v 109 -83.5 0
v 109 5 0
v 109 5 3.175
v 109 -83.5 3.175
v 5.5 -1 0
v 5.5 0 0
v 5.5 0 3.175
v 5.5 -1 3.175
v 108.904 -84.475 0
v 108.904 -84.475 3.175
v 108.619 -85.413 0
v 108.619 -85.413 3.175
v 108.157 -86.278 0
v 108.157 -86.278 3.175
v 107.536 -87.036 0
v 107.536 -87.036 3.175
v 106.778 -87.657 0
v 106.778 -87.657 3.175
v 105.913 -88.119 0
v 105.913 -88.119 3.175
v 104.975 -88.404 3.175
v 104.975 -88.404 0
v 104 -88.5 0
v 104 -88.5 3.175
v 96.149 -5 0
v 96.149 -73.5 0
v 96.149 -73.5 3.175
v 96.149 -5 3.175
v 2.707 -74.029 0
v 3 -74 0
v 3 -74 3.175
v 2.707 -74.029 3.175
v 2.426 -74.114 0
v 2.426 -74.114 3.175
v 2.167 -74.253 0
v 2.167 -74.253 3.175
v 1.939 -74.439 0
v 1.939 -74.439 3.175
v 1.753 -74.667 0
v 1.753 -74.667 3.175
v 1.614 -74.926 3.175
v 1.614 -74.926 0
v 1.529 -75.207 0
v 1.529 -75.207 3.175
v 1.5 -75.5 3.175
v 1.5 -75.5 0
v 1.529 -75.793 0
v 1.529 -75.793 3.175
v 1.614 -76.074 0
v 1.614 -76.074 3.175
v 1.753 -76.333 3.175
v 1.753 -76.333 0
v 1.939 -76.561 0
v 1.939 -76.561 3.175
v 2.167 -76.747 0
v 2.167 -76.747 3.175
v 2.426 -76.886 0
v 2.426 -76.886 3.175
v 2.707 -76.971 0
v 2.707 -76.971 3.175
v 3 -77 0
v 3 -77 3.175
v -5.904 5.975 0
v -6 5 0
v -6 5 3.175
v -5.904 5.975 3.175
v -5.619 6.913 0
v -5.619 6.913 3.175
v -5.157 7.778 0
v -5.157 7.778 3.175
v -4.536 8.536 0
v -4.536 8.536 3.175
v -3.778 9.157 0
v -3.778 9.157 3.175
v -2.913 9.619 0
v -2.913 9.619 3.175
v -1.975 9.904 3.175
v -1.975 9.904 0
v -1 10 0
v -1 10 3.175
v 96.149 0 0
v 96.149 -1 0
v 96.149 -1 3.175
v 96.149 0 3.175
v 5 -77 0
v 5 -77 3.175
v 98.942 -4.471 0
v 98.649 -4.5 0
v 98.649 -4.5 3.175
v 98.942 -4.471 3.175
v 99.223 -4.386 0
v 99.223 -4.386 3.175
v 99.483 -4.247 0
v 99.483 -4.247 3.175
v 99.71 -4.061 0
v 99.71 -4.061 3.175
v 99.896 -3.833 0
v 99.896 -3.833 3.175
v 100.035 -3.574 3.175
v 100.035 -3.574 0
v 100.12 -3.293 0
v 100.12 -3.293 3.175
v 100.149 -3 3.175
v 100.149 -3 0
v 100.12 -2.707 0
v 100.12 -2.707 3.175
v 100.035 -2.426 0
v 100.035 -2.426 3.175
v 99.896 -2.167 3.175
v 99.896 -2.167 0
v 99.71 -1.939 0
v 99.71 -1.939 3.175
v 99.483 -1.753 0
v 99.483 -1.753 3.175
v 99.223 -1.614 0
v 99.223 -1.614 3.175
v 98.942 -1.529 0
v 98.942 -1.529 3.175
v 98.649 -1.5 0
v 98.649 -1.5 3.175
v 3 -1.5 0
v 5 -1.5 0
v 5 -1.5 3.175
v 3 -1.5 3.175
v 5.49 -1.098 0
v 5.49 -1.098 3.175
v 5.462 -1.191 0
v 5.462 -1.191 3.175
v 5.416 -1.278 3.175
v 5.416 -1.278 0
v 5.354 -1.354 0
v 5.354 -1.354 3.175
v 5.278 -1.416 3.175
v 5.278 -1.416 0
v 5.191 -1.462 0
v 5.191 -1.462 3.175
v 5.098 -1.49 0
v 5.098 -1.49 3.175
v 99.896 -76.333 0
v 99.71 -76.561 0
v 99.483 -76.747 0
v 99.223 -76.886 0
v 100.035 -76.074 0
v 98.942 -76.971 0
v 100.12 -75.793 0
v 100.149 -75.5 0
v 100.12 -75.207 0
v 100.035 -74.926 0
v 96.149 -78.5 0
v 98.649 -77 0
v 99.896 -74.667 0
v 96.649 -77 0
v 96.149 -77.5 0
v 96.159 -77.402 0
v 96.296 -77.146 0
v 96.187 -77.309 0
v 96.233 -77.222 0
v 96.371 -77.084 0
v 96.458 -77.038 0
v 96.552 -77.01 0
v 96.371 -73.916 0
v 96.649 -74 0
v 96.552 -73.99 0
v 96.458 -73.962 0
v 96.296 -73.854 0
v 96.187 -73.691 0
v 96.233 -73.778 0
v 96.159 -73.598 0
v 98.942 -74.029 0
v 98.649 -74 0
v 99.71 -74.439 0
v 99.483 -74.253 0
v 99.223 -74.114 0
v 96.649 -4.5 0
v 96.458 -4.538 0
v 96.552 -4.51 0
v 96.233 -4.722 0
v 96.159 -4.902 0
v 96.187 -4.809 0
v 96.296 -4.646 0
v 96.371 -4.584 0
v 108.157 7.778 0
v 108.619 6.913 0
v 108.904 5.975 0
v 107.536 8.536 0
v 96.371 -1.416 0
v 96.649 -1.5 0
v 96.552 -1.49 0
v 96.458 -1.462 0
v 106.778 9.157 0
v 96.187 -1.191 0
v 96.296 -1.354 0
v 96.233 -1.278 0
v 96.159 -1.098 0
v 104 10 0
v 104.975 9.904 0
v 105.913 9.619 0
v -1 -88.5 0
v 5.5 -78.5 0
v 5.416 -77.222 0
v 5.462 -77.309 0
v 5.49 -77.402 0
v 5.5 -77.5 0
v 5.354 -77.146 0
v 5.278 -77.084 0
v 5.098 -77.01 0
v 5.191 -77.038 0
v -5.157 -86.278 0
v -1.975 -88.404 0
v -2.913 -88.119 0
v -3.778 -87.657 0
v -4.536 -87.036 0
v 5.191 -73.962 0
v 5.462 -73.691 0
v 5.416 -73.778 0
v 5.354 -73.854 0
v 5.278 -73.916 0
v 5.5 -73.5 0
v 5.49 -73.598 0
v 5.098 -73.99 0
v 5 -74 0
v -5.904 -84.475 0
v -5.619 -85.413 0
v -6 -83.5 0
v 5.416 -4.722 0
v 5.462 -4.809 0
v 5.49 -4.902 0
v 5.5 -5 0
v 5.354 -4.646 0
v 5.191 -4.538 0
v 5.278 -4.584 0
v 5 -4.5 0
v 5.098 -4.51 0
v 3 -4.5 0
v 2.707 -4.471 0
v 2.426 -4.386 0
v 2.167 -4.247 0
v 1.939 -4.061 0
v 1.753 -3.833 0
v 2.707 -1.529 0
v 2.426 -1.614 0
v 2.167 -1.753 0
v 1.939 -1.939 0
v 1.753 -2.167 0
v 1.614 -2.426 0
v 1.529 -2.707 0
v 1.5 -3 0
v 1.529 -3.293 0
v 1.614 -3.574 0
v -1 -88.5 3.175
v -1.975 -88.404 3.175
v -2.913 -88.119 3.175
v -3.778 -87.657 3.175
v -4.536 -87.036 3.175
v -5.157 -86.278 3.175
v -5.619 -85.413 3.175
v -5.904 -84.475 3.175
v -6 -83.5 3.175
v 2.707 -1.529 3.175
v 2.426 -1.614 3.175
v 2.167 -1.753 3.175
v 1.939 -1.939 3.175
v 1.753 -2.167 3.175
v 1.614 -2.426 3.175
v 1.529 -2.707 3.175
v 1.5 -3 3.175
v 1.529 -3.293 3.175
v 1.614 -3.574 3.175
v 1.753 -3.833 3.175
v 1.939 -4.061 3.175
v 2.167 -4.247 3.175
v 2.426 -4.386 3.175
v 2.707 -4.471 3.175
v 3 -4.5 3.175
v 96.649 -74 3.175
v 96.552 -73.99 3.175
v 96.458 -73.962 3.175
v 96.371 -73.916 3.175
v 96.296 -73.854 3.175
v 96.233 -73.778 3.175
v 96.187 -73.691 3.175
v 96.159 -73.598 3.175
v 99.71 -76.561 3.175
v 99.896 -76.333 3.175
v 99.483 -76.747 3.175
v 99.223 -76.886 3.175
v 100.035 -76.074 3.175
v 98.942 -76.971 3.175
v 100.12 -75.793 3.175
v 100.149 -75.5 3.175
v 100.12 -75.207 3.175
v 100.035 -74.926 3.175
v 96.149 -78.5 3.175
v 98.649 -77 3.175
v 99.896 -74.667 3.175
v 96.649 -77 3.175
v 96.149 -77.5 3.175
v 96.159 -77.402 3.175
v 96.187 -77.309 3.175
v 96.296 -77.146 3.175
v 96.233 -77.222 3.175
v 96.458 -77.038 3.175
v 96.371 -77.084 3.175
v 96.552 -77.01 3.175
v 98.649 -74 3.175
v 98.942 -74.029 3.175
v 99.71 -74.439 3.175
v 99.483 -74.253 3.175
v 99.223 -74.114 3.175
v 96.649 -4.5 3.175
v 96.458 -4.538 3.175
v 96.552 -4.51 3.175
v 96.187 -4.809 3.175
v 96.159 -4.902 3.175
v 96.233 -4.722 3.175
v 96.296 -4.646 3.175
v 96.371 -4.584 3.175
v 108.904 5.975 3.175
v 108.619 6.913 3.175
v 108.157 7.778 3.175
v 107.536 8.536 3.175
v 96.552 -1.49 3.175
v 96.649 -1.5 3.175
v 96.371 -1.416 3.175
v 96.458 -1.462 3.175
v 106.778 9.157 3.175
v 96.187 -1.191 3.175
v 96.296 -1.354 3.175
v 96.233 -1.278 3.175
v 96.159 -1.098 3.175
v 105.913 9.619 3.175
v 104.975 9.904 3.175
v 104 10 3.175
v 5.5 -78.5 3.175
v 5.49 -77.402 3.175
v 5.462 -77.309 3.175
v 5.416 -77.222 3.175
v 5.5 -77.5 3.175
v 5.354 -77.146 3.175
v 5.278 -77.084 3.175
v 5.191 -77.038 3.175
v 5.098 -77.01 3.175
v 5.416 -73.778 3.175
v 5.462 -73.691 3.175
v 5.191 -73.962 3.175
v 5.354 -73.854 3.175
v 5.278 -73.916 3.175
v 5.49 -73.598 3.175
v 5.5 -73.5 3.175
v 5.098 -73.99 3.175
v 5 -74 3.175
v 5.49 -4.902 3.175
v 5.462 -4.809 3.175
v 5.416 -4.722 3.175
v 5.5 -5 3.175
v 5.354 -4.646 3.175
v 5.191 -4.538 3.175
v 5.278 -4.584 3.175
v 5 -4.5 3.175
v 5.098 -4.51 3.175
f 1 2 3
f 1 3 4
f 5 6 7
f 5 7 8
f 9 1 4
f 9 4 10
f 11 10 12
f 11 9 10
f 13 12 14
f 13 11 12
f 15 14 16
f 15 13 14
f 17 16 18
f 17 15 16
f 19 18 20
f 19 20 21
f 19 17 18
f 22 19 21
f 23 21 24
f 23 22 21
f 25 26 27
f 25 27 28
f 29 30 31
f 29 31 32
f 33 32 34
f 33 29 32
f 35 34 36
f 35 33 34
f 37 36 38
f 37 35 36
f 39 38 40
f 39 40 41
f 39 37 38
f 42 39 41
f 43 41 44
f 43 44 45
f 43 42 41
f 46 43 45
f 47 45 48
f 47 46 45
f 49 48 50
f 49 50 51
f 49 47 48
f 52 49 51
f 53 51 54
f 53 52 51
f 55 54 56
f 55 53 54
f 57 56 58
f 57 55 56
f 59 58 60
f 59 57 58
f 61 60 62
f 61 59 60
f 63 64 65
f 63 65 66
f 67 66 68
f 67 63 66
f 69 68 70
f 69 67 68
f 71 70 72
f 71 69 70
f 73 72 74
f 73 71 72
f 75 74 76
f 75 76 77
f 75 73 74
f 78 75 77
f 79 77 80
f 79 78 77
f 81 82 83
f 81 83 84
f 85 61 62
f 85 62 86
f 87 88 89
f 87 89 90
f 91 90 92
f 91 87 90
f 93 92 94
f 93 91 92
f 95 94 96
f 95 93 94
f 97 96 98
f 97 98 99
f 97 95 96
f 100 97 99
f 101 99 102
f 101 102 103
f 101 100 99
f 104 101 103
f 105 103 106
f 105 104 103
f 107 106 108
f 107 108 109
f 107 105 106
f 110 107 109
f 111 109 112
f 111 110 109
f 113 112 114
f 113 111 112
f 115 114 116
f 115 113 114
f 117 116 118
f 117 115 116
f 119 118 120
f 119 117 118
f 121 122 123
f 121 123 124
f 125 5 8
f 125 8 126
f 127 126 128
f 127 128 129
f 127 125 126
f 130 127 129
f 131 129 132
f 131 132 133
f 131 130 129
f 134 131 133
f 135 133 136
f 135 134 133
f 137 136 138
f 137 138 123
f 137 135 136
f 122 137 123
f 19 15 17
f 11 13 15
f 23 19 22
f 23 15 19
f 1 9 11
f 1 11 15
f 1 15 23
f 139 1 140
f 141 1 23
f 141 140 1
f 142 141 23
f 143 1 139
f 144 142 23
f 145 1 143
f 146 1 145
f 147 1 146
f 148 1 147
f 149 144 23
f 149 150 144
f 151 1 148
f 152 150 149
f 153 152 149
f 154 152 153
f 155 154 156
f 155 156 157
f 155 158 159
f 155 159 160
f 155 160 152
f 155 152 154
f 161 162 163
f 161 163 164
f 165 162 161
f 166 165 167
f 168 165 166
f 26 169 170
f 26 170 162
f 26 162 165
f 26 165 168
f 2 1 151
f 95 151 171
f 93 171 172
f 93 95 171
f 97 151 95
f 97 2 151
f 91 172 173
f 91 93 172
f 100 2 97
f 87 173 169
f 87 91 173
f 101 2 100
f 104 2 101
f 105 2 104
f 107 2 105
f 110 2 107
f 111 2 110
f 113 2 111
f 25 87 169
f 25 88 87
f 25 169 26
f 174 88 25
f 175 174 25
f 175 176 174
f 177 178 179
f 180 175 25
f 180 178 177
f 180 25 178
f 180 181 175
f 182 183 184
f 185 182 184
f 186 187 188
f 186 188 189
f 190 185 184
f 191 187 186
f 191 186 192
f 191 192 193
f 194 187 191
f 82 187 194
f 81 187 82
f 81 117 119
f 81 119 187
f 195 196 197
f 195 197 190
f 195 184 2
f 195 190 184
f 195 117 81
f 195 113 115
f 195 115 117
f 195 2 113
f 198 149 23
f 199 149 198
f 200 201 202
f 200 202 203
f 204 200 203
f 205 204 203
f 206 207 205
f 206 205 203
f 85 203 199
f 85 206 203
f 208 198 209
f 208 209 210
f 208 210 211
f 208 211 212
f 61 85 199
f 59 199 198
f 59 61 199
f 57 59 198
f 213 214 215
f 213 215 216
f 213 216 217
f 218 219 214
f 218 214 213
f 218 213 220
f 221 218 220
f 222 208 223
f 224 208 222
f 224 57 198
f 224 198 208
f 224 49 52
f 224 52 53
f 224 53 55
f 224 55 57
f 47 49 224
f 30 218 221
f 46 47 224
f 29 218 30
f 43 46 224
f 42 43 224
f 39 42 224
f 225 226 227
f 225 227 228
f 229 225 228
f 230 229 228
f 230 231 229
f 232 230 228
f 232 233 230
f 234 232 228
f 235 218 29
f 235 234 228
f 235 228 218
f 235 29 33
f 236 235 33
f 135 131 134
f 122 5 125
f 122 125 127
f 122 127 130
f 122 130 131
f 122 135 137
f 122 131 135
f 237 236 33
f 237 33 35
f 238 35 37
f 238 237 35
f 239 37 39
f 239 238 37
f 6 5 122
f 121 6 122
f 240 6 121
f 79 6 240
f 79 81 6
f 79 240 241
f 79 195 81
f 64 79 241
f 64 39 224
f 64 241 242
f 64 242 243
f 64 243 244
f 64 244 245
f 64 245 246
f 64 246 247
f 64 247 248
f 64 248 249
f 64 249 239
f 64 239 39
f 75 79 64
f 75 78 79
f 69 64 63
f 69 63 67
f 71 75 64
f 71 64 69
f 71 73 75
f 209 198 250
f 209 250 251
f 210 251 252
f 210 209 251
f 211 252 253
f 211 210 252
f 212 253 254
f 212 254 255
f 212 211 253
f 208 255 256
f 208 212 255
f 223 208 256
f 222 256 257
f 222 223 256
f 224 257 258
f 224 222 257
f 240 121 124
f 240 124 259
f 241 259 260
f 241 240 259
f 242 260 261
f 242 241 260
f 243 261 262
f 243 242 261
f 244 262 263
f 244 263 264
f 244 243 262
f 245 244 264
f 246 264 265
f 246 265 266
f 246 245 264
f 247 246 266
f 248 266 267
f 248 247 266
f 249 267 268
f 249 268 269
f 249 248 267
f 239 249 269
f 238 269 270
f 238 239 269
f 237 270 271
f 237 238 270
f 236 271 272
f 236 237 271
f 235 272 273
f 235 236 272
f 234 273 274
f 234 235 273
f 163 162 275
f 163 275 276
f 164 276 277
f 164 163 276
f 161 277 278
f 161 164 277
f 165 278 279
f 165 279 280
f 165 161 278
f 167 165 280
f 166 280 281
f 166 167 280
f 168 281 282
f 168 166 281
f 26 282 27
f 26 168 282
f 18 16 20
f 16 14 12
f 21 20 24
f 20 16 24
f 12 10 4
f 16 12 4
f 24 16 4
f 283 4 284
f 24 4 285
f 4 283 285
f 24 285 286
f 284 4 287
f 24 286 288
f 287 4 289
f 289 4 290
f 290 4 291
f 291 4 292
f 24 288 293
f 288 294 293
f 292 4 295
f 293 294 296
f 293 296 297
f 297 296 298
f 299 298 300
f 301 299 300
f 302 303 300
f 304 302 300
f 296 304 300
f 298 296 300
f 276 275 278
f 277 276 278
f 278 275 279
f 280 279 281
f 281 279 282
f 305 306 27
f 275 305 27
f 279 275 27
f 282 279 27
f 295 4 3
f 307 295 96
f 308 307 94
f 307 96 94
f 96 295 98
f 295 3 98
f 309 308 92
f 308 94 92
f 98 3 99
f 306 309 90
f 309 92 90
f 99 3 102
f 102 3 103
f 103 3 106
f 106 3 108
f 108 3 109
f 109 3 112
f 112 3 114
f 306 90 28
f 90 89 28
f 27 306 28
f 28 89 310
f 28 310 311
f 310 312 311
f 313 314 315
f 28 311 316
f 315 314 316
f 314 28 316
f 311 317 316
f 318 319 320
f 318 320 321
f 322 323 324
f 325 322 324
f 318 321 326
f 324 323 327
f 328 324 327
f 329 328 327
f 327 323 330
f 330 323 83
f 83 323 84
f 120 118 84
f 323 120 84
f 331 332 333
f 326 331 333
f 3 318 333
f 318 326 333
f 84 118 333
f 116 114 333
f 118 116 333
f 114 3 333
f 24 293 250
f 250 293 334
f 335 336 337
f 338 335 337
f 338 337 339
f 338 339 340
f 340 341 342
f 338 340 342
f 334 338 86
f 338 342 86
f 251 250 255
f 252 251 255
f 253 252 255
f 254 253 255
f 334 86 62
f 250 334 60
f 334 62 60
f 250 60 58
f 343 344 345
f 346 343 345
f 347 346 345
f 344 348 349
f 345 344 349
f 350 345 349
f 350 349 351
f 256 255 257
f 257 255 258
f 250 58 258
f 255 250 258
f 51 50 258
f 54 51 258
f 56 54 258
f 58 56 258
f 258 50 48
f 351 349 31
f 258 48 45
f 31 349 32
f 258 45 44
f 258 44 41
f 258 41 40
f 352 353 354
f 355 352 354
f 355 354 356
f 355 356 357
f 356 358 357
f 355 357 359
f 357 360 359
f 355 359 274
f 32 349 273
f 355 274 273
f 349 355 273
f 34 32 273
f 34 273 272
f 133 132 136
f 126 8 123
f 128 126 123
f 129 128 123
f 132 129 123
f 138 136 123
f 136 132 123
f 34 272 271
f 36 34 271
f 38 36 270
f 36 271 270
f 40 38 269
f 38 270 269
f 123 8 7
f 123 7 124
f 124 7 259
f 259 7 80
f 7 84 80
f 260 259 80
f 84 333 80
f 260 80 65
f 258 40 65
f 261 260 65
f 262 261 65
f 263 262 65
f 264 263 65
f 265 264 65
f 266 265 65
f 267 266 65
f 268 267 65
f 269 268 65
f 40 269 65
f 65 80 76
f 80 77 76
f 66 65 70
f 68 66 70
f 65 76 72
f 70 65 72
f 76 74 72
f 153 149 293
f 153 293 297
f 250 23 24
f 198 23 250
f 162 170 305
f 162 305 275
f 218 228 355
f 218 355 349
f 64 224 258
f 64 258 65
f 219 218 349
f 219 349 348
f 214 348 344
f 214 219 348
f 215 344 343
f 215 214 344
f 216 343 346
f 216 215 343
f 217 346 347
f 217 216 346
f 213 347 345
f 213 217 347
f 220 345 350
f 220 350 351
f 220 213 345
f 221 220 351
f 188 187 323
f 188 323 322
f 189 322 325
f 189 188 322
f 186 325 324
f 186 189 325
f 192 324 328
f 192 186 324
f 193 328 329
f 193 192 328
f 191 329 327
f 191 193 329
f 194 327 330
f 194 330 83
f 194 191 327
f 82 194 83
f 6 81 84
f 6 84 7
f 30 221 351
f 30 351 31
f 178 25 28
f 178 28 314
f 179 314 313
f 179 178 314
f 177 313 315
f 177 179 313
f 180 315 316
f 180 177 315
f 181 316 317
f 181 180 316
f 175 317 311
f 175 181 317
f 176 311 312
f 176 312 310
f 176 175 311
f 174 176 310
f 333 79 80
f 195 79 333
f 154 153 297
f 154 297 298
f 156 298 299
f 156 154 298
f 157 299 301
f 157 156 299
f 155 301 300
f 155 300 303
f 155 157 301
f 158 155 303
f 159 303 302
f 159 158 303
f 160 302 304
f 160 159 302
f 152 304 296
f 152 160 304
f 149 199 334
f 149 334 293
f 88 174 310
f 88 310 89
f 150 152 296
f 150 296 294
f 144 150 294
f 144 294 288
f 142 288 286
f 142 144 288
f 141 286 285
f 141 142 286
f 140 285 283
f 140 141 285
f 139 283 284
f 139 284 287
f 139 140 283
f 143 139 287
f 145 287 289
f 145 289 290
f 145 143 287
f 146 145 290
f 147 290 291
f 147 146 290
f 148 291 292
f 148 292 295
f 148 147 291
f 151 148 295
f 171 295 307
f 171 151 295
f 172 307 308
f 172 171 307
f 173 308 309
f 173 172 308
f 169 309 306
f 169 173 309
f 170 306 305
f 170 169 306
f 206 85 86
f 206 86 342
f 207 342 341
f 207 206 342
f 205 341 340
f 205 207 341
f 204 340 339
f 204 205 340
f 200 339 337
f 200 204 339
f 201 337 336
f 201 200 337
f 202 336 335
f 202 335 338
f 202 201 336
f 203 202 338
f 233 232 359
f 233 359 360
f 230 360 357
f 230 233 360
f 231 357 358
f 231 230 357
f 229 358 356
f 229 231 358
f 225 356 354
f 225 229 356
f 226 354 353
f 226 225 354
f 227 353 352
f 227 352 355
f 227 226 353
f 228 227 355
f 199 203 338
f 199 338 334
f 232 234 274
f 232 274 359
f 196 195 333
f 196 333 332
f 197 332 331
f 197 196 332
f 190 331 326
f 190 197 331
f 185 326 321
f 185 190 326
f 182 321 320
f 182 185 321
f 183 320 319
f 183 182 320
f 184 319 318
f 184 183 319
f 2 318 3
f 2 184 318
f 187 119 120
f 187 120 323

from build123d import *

# Parameters (mm, degrees)
BOSS_EXTRUDE1_DEPTH = 3.175


with BuildPart() as part:
    # Sketch2 → Boss-Extrude1 (new body)
    with BuildSketch(Plane.XY):
        with BuildLine():
            Line((-1, 10), (104, 10))
            ThreePointArc((104, 10), (107.535533906, 8.535533906), (109, 5))
            Line((109, 5), (109, -83.5))
            ThreePointArc((109, -83.5), (107.535533906, -87.035533906), (104, -88.5))
            Line((104, -88.5), (-1, -88.5))
            ThreePointArc((-1, -88.5), (-4.535533906, -87.035533906), (-6, -83.5))
            Line((-6, -83.5), (-6, 5))
            ThreePointArc((-6, 5), (-4.535533906, 8.535533906), (-1, 10))
        make_face()
        with BuildLine():
            Line((5.5, 0), (5.5, -1))
            ThreePointArc((5.5, -1), (5.353553391, -1.353553391), (5, -1.5))
            Line((5, -1.5), (3, -1.5))
            ThreePointArc((3, -1.5), (1.5, -3), (3, -4.5))
            Line((3, -4.5), (5, -4.5))
            ThreePointArc((5, -4.5), (5.353553391, -4.646446609), (5.5, -5))
            Line((5.5, -5), (5.5, -73.5))
            ThreePointArc((5.5, -73.5), (5.353553391, -73.853553391), (5, -74))
            Line((5, -74), (3, -74))
            ThreePointArc((3, -74), (1.5, -75.5), (3, -77))
            Line((3, -77), (5, -77))
            ThreePointArc((5, -77), (5.353553391, -77.146446609), (5.5, -77.5))
            Line((5.5, -77.5), (5.5, -78.5))
            Line((5.5, -78.5), (96.149180328, -78.5))
            Line((96.149180328, -78.5), (96.149180328, -77.5))
            ThreePointArc((96.149180328, -77.5), (96.295626937, -77.146446609), (96.649180328, -77))
            Line((96.649180328, -77), (98.649180328, -77))
            ThreePointArc((98.649180328, -77), (100.149180328, -75.5), (98.649180328, -74))
            Line((98.649180328, -74), (96.649180328, -74))
            ThreePointArc((96.649180328, -74), (96.295626937, -73.853553391), (96.149180328, -73.5))
            Line((96.149180328, -73.5), (96.149180328, -5))
            ThreePointArc((96.149180328, -5), (96.295626937, -4.646446609), (96.649180328, -4.5))
            Line((96.649180328, -4.5), (98.649180328, -4.5))
            ThreePointArc((98.649180328, -4.5), (100.149180328, -3), (98.649180328, -1.5))
            Line((98.649180328, -1.5), (96.649180328, -1.5))
            ThreePointArc((96.649180328, -1.5), (96.295626937, -1.353553391), (96.149180328, -1))
            Line((96.149180328, -1), (96.149180328, 0))
            Line((96.149180328, 0), (5.5, 0))
        make_face(mode=Mode.SUBTRACT)
    extrude(amount=BOSS_EXTRUDE1_DEPTH)


solid = part.part
